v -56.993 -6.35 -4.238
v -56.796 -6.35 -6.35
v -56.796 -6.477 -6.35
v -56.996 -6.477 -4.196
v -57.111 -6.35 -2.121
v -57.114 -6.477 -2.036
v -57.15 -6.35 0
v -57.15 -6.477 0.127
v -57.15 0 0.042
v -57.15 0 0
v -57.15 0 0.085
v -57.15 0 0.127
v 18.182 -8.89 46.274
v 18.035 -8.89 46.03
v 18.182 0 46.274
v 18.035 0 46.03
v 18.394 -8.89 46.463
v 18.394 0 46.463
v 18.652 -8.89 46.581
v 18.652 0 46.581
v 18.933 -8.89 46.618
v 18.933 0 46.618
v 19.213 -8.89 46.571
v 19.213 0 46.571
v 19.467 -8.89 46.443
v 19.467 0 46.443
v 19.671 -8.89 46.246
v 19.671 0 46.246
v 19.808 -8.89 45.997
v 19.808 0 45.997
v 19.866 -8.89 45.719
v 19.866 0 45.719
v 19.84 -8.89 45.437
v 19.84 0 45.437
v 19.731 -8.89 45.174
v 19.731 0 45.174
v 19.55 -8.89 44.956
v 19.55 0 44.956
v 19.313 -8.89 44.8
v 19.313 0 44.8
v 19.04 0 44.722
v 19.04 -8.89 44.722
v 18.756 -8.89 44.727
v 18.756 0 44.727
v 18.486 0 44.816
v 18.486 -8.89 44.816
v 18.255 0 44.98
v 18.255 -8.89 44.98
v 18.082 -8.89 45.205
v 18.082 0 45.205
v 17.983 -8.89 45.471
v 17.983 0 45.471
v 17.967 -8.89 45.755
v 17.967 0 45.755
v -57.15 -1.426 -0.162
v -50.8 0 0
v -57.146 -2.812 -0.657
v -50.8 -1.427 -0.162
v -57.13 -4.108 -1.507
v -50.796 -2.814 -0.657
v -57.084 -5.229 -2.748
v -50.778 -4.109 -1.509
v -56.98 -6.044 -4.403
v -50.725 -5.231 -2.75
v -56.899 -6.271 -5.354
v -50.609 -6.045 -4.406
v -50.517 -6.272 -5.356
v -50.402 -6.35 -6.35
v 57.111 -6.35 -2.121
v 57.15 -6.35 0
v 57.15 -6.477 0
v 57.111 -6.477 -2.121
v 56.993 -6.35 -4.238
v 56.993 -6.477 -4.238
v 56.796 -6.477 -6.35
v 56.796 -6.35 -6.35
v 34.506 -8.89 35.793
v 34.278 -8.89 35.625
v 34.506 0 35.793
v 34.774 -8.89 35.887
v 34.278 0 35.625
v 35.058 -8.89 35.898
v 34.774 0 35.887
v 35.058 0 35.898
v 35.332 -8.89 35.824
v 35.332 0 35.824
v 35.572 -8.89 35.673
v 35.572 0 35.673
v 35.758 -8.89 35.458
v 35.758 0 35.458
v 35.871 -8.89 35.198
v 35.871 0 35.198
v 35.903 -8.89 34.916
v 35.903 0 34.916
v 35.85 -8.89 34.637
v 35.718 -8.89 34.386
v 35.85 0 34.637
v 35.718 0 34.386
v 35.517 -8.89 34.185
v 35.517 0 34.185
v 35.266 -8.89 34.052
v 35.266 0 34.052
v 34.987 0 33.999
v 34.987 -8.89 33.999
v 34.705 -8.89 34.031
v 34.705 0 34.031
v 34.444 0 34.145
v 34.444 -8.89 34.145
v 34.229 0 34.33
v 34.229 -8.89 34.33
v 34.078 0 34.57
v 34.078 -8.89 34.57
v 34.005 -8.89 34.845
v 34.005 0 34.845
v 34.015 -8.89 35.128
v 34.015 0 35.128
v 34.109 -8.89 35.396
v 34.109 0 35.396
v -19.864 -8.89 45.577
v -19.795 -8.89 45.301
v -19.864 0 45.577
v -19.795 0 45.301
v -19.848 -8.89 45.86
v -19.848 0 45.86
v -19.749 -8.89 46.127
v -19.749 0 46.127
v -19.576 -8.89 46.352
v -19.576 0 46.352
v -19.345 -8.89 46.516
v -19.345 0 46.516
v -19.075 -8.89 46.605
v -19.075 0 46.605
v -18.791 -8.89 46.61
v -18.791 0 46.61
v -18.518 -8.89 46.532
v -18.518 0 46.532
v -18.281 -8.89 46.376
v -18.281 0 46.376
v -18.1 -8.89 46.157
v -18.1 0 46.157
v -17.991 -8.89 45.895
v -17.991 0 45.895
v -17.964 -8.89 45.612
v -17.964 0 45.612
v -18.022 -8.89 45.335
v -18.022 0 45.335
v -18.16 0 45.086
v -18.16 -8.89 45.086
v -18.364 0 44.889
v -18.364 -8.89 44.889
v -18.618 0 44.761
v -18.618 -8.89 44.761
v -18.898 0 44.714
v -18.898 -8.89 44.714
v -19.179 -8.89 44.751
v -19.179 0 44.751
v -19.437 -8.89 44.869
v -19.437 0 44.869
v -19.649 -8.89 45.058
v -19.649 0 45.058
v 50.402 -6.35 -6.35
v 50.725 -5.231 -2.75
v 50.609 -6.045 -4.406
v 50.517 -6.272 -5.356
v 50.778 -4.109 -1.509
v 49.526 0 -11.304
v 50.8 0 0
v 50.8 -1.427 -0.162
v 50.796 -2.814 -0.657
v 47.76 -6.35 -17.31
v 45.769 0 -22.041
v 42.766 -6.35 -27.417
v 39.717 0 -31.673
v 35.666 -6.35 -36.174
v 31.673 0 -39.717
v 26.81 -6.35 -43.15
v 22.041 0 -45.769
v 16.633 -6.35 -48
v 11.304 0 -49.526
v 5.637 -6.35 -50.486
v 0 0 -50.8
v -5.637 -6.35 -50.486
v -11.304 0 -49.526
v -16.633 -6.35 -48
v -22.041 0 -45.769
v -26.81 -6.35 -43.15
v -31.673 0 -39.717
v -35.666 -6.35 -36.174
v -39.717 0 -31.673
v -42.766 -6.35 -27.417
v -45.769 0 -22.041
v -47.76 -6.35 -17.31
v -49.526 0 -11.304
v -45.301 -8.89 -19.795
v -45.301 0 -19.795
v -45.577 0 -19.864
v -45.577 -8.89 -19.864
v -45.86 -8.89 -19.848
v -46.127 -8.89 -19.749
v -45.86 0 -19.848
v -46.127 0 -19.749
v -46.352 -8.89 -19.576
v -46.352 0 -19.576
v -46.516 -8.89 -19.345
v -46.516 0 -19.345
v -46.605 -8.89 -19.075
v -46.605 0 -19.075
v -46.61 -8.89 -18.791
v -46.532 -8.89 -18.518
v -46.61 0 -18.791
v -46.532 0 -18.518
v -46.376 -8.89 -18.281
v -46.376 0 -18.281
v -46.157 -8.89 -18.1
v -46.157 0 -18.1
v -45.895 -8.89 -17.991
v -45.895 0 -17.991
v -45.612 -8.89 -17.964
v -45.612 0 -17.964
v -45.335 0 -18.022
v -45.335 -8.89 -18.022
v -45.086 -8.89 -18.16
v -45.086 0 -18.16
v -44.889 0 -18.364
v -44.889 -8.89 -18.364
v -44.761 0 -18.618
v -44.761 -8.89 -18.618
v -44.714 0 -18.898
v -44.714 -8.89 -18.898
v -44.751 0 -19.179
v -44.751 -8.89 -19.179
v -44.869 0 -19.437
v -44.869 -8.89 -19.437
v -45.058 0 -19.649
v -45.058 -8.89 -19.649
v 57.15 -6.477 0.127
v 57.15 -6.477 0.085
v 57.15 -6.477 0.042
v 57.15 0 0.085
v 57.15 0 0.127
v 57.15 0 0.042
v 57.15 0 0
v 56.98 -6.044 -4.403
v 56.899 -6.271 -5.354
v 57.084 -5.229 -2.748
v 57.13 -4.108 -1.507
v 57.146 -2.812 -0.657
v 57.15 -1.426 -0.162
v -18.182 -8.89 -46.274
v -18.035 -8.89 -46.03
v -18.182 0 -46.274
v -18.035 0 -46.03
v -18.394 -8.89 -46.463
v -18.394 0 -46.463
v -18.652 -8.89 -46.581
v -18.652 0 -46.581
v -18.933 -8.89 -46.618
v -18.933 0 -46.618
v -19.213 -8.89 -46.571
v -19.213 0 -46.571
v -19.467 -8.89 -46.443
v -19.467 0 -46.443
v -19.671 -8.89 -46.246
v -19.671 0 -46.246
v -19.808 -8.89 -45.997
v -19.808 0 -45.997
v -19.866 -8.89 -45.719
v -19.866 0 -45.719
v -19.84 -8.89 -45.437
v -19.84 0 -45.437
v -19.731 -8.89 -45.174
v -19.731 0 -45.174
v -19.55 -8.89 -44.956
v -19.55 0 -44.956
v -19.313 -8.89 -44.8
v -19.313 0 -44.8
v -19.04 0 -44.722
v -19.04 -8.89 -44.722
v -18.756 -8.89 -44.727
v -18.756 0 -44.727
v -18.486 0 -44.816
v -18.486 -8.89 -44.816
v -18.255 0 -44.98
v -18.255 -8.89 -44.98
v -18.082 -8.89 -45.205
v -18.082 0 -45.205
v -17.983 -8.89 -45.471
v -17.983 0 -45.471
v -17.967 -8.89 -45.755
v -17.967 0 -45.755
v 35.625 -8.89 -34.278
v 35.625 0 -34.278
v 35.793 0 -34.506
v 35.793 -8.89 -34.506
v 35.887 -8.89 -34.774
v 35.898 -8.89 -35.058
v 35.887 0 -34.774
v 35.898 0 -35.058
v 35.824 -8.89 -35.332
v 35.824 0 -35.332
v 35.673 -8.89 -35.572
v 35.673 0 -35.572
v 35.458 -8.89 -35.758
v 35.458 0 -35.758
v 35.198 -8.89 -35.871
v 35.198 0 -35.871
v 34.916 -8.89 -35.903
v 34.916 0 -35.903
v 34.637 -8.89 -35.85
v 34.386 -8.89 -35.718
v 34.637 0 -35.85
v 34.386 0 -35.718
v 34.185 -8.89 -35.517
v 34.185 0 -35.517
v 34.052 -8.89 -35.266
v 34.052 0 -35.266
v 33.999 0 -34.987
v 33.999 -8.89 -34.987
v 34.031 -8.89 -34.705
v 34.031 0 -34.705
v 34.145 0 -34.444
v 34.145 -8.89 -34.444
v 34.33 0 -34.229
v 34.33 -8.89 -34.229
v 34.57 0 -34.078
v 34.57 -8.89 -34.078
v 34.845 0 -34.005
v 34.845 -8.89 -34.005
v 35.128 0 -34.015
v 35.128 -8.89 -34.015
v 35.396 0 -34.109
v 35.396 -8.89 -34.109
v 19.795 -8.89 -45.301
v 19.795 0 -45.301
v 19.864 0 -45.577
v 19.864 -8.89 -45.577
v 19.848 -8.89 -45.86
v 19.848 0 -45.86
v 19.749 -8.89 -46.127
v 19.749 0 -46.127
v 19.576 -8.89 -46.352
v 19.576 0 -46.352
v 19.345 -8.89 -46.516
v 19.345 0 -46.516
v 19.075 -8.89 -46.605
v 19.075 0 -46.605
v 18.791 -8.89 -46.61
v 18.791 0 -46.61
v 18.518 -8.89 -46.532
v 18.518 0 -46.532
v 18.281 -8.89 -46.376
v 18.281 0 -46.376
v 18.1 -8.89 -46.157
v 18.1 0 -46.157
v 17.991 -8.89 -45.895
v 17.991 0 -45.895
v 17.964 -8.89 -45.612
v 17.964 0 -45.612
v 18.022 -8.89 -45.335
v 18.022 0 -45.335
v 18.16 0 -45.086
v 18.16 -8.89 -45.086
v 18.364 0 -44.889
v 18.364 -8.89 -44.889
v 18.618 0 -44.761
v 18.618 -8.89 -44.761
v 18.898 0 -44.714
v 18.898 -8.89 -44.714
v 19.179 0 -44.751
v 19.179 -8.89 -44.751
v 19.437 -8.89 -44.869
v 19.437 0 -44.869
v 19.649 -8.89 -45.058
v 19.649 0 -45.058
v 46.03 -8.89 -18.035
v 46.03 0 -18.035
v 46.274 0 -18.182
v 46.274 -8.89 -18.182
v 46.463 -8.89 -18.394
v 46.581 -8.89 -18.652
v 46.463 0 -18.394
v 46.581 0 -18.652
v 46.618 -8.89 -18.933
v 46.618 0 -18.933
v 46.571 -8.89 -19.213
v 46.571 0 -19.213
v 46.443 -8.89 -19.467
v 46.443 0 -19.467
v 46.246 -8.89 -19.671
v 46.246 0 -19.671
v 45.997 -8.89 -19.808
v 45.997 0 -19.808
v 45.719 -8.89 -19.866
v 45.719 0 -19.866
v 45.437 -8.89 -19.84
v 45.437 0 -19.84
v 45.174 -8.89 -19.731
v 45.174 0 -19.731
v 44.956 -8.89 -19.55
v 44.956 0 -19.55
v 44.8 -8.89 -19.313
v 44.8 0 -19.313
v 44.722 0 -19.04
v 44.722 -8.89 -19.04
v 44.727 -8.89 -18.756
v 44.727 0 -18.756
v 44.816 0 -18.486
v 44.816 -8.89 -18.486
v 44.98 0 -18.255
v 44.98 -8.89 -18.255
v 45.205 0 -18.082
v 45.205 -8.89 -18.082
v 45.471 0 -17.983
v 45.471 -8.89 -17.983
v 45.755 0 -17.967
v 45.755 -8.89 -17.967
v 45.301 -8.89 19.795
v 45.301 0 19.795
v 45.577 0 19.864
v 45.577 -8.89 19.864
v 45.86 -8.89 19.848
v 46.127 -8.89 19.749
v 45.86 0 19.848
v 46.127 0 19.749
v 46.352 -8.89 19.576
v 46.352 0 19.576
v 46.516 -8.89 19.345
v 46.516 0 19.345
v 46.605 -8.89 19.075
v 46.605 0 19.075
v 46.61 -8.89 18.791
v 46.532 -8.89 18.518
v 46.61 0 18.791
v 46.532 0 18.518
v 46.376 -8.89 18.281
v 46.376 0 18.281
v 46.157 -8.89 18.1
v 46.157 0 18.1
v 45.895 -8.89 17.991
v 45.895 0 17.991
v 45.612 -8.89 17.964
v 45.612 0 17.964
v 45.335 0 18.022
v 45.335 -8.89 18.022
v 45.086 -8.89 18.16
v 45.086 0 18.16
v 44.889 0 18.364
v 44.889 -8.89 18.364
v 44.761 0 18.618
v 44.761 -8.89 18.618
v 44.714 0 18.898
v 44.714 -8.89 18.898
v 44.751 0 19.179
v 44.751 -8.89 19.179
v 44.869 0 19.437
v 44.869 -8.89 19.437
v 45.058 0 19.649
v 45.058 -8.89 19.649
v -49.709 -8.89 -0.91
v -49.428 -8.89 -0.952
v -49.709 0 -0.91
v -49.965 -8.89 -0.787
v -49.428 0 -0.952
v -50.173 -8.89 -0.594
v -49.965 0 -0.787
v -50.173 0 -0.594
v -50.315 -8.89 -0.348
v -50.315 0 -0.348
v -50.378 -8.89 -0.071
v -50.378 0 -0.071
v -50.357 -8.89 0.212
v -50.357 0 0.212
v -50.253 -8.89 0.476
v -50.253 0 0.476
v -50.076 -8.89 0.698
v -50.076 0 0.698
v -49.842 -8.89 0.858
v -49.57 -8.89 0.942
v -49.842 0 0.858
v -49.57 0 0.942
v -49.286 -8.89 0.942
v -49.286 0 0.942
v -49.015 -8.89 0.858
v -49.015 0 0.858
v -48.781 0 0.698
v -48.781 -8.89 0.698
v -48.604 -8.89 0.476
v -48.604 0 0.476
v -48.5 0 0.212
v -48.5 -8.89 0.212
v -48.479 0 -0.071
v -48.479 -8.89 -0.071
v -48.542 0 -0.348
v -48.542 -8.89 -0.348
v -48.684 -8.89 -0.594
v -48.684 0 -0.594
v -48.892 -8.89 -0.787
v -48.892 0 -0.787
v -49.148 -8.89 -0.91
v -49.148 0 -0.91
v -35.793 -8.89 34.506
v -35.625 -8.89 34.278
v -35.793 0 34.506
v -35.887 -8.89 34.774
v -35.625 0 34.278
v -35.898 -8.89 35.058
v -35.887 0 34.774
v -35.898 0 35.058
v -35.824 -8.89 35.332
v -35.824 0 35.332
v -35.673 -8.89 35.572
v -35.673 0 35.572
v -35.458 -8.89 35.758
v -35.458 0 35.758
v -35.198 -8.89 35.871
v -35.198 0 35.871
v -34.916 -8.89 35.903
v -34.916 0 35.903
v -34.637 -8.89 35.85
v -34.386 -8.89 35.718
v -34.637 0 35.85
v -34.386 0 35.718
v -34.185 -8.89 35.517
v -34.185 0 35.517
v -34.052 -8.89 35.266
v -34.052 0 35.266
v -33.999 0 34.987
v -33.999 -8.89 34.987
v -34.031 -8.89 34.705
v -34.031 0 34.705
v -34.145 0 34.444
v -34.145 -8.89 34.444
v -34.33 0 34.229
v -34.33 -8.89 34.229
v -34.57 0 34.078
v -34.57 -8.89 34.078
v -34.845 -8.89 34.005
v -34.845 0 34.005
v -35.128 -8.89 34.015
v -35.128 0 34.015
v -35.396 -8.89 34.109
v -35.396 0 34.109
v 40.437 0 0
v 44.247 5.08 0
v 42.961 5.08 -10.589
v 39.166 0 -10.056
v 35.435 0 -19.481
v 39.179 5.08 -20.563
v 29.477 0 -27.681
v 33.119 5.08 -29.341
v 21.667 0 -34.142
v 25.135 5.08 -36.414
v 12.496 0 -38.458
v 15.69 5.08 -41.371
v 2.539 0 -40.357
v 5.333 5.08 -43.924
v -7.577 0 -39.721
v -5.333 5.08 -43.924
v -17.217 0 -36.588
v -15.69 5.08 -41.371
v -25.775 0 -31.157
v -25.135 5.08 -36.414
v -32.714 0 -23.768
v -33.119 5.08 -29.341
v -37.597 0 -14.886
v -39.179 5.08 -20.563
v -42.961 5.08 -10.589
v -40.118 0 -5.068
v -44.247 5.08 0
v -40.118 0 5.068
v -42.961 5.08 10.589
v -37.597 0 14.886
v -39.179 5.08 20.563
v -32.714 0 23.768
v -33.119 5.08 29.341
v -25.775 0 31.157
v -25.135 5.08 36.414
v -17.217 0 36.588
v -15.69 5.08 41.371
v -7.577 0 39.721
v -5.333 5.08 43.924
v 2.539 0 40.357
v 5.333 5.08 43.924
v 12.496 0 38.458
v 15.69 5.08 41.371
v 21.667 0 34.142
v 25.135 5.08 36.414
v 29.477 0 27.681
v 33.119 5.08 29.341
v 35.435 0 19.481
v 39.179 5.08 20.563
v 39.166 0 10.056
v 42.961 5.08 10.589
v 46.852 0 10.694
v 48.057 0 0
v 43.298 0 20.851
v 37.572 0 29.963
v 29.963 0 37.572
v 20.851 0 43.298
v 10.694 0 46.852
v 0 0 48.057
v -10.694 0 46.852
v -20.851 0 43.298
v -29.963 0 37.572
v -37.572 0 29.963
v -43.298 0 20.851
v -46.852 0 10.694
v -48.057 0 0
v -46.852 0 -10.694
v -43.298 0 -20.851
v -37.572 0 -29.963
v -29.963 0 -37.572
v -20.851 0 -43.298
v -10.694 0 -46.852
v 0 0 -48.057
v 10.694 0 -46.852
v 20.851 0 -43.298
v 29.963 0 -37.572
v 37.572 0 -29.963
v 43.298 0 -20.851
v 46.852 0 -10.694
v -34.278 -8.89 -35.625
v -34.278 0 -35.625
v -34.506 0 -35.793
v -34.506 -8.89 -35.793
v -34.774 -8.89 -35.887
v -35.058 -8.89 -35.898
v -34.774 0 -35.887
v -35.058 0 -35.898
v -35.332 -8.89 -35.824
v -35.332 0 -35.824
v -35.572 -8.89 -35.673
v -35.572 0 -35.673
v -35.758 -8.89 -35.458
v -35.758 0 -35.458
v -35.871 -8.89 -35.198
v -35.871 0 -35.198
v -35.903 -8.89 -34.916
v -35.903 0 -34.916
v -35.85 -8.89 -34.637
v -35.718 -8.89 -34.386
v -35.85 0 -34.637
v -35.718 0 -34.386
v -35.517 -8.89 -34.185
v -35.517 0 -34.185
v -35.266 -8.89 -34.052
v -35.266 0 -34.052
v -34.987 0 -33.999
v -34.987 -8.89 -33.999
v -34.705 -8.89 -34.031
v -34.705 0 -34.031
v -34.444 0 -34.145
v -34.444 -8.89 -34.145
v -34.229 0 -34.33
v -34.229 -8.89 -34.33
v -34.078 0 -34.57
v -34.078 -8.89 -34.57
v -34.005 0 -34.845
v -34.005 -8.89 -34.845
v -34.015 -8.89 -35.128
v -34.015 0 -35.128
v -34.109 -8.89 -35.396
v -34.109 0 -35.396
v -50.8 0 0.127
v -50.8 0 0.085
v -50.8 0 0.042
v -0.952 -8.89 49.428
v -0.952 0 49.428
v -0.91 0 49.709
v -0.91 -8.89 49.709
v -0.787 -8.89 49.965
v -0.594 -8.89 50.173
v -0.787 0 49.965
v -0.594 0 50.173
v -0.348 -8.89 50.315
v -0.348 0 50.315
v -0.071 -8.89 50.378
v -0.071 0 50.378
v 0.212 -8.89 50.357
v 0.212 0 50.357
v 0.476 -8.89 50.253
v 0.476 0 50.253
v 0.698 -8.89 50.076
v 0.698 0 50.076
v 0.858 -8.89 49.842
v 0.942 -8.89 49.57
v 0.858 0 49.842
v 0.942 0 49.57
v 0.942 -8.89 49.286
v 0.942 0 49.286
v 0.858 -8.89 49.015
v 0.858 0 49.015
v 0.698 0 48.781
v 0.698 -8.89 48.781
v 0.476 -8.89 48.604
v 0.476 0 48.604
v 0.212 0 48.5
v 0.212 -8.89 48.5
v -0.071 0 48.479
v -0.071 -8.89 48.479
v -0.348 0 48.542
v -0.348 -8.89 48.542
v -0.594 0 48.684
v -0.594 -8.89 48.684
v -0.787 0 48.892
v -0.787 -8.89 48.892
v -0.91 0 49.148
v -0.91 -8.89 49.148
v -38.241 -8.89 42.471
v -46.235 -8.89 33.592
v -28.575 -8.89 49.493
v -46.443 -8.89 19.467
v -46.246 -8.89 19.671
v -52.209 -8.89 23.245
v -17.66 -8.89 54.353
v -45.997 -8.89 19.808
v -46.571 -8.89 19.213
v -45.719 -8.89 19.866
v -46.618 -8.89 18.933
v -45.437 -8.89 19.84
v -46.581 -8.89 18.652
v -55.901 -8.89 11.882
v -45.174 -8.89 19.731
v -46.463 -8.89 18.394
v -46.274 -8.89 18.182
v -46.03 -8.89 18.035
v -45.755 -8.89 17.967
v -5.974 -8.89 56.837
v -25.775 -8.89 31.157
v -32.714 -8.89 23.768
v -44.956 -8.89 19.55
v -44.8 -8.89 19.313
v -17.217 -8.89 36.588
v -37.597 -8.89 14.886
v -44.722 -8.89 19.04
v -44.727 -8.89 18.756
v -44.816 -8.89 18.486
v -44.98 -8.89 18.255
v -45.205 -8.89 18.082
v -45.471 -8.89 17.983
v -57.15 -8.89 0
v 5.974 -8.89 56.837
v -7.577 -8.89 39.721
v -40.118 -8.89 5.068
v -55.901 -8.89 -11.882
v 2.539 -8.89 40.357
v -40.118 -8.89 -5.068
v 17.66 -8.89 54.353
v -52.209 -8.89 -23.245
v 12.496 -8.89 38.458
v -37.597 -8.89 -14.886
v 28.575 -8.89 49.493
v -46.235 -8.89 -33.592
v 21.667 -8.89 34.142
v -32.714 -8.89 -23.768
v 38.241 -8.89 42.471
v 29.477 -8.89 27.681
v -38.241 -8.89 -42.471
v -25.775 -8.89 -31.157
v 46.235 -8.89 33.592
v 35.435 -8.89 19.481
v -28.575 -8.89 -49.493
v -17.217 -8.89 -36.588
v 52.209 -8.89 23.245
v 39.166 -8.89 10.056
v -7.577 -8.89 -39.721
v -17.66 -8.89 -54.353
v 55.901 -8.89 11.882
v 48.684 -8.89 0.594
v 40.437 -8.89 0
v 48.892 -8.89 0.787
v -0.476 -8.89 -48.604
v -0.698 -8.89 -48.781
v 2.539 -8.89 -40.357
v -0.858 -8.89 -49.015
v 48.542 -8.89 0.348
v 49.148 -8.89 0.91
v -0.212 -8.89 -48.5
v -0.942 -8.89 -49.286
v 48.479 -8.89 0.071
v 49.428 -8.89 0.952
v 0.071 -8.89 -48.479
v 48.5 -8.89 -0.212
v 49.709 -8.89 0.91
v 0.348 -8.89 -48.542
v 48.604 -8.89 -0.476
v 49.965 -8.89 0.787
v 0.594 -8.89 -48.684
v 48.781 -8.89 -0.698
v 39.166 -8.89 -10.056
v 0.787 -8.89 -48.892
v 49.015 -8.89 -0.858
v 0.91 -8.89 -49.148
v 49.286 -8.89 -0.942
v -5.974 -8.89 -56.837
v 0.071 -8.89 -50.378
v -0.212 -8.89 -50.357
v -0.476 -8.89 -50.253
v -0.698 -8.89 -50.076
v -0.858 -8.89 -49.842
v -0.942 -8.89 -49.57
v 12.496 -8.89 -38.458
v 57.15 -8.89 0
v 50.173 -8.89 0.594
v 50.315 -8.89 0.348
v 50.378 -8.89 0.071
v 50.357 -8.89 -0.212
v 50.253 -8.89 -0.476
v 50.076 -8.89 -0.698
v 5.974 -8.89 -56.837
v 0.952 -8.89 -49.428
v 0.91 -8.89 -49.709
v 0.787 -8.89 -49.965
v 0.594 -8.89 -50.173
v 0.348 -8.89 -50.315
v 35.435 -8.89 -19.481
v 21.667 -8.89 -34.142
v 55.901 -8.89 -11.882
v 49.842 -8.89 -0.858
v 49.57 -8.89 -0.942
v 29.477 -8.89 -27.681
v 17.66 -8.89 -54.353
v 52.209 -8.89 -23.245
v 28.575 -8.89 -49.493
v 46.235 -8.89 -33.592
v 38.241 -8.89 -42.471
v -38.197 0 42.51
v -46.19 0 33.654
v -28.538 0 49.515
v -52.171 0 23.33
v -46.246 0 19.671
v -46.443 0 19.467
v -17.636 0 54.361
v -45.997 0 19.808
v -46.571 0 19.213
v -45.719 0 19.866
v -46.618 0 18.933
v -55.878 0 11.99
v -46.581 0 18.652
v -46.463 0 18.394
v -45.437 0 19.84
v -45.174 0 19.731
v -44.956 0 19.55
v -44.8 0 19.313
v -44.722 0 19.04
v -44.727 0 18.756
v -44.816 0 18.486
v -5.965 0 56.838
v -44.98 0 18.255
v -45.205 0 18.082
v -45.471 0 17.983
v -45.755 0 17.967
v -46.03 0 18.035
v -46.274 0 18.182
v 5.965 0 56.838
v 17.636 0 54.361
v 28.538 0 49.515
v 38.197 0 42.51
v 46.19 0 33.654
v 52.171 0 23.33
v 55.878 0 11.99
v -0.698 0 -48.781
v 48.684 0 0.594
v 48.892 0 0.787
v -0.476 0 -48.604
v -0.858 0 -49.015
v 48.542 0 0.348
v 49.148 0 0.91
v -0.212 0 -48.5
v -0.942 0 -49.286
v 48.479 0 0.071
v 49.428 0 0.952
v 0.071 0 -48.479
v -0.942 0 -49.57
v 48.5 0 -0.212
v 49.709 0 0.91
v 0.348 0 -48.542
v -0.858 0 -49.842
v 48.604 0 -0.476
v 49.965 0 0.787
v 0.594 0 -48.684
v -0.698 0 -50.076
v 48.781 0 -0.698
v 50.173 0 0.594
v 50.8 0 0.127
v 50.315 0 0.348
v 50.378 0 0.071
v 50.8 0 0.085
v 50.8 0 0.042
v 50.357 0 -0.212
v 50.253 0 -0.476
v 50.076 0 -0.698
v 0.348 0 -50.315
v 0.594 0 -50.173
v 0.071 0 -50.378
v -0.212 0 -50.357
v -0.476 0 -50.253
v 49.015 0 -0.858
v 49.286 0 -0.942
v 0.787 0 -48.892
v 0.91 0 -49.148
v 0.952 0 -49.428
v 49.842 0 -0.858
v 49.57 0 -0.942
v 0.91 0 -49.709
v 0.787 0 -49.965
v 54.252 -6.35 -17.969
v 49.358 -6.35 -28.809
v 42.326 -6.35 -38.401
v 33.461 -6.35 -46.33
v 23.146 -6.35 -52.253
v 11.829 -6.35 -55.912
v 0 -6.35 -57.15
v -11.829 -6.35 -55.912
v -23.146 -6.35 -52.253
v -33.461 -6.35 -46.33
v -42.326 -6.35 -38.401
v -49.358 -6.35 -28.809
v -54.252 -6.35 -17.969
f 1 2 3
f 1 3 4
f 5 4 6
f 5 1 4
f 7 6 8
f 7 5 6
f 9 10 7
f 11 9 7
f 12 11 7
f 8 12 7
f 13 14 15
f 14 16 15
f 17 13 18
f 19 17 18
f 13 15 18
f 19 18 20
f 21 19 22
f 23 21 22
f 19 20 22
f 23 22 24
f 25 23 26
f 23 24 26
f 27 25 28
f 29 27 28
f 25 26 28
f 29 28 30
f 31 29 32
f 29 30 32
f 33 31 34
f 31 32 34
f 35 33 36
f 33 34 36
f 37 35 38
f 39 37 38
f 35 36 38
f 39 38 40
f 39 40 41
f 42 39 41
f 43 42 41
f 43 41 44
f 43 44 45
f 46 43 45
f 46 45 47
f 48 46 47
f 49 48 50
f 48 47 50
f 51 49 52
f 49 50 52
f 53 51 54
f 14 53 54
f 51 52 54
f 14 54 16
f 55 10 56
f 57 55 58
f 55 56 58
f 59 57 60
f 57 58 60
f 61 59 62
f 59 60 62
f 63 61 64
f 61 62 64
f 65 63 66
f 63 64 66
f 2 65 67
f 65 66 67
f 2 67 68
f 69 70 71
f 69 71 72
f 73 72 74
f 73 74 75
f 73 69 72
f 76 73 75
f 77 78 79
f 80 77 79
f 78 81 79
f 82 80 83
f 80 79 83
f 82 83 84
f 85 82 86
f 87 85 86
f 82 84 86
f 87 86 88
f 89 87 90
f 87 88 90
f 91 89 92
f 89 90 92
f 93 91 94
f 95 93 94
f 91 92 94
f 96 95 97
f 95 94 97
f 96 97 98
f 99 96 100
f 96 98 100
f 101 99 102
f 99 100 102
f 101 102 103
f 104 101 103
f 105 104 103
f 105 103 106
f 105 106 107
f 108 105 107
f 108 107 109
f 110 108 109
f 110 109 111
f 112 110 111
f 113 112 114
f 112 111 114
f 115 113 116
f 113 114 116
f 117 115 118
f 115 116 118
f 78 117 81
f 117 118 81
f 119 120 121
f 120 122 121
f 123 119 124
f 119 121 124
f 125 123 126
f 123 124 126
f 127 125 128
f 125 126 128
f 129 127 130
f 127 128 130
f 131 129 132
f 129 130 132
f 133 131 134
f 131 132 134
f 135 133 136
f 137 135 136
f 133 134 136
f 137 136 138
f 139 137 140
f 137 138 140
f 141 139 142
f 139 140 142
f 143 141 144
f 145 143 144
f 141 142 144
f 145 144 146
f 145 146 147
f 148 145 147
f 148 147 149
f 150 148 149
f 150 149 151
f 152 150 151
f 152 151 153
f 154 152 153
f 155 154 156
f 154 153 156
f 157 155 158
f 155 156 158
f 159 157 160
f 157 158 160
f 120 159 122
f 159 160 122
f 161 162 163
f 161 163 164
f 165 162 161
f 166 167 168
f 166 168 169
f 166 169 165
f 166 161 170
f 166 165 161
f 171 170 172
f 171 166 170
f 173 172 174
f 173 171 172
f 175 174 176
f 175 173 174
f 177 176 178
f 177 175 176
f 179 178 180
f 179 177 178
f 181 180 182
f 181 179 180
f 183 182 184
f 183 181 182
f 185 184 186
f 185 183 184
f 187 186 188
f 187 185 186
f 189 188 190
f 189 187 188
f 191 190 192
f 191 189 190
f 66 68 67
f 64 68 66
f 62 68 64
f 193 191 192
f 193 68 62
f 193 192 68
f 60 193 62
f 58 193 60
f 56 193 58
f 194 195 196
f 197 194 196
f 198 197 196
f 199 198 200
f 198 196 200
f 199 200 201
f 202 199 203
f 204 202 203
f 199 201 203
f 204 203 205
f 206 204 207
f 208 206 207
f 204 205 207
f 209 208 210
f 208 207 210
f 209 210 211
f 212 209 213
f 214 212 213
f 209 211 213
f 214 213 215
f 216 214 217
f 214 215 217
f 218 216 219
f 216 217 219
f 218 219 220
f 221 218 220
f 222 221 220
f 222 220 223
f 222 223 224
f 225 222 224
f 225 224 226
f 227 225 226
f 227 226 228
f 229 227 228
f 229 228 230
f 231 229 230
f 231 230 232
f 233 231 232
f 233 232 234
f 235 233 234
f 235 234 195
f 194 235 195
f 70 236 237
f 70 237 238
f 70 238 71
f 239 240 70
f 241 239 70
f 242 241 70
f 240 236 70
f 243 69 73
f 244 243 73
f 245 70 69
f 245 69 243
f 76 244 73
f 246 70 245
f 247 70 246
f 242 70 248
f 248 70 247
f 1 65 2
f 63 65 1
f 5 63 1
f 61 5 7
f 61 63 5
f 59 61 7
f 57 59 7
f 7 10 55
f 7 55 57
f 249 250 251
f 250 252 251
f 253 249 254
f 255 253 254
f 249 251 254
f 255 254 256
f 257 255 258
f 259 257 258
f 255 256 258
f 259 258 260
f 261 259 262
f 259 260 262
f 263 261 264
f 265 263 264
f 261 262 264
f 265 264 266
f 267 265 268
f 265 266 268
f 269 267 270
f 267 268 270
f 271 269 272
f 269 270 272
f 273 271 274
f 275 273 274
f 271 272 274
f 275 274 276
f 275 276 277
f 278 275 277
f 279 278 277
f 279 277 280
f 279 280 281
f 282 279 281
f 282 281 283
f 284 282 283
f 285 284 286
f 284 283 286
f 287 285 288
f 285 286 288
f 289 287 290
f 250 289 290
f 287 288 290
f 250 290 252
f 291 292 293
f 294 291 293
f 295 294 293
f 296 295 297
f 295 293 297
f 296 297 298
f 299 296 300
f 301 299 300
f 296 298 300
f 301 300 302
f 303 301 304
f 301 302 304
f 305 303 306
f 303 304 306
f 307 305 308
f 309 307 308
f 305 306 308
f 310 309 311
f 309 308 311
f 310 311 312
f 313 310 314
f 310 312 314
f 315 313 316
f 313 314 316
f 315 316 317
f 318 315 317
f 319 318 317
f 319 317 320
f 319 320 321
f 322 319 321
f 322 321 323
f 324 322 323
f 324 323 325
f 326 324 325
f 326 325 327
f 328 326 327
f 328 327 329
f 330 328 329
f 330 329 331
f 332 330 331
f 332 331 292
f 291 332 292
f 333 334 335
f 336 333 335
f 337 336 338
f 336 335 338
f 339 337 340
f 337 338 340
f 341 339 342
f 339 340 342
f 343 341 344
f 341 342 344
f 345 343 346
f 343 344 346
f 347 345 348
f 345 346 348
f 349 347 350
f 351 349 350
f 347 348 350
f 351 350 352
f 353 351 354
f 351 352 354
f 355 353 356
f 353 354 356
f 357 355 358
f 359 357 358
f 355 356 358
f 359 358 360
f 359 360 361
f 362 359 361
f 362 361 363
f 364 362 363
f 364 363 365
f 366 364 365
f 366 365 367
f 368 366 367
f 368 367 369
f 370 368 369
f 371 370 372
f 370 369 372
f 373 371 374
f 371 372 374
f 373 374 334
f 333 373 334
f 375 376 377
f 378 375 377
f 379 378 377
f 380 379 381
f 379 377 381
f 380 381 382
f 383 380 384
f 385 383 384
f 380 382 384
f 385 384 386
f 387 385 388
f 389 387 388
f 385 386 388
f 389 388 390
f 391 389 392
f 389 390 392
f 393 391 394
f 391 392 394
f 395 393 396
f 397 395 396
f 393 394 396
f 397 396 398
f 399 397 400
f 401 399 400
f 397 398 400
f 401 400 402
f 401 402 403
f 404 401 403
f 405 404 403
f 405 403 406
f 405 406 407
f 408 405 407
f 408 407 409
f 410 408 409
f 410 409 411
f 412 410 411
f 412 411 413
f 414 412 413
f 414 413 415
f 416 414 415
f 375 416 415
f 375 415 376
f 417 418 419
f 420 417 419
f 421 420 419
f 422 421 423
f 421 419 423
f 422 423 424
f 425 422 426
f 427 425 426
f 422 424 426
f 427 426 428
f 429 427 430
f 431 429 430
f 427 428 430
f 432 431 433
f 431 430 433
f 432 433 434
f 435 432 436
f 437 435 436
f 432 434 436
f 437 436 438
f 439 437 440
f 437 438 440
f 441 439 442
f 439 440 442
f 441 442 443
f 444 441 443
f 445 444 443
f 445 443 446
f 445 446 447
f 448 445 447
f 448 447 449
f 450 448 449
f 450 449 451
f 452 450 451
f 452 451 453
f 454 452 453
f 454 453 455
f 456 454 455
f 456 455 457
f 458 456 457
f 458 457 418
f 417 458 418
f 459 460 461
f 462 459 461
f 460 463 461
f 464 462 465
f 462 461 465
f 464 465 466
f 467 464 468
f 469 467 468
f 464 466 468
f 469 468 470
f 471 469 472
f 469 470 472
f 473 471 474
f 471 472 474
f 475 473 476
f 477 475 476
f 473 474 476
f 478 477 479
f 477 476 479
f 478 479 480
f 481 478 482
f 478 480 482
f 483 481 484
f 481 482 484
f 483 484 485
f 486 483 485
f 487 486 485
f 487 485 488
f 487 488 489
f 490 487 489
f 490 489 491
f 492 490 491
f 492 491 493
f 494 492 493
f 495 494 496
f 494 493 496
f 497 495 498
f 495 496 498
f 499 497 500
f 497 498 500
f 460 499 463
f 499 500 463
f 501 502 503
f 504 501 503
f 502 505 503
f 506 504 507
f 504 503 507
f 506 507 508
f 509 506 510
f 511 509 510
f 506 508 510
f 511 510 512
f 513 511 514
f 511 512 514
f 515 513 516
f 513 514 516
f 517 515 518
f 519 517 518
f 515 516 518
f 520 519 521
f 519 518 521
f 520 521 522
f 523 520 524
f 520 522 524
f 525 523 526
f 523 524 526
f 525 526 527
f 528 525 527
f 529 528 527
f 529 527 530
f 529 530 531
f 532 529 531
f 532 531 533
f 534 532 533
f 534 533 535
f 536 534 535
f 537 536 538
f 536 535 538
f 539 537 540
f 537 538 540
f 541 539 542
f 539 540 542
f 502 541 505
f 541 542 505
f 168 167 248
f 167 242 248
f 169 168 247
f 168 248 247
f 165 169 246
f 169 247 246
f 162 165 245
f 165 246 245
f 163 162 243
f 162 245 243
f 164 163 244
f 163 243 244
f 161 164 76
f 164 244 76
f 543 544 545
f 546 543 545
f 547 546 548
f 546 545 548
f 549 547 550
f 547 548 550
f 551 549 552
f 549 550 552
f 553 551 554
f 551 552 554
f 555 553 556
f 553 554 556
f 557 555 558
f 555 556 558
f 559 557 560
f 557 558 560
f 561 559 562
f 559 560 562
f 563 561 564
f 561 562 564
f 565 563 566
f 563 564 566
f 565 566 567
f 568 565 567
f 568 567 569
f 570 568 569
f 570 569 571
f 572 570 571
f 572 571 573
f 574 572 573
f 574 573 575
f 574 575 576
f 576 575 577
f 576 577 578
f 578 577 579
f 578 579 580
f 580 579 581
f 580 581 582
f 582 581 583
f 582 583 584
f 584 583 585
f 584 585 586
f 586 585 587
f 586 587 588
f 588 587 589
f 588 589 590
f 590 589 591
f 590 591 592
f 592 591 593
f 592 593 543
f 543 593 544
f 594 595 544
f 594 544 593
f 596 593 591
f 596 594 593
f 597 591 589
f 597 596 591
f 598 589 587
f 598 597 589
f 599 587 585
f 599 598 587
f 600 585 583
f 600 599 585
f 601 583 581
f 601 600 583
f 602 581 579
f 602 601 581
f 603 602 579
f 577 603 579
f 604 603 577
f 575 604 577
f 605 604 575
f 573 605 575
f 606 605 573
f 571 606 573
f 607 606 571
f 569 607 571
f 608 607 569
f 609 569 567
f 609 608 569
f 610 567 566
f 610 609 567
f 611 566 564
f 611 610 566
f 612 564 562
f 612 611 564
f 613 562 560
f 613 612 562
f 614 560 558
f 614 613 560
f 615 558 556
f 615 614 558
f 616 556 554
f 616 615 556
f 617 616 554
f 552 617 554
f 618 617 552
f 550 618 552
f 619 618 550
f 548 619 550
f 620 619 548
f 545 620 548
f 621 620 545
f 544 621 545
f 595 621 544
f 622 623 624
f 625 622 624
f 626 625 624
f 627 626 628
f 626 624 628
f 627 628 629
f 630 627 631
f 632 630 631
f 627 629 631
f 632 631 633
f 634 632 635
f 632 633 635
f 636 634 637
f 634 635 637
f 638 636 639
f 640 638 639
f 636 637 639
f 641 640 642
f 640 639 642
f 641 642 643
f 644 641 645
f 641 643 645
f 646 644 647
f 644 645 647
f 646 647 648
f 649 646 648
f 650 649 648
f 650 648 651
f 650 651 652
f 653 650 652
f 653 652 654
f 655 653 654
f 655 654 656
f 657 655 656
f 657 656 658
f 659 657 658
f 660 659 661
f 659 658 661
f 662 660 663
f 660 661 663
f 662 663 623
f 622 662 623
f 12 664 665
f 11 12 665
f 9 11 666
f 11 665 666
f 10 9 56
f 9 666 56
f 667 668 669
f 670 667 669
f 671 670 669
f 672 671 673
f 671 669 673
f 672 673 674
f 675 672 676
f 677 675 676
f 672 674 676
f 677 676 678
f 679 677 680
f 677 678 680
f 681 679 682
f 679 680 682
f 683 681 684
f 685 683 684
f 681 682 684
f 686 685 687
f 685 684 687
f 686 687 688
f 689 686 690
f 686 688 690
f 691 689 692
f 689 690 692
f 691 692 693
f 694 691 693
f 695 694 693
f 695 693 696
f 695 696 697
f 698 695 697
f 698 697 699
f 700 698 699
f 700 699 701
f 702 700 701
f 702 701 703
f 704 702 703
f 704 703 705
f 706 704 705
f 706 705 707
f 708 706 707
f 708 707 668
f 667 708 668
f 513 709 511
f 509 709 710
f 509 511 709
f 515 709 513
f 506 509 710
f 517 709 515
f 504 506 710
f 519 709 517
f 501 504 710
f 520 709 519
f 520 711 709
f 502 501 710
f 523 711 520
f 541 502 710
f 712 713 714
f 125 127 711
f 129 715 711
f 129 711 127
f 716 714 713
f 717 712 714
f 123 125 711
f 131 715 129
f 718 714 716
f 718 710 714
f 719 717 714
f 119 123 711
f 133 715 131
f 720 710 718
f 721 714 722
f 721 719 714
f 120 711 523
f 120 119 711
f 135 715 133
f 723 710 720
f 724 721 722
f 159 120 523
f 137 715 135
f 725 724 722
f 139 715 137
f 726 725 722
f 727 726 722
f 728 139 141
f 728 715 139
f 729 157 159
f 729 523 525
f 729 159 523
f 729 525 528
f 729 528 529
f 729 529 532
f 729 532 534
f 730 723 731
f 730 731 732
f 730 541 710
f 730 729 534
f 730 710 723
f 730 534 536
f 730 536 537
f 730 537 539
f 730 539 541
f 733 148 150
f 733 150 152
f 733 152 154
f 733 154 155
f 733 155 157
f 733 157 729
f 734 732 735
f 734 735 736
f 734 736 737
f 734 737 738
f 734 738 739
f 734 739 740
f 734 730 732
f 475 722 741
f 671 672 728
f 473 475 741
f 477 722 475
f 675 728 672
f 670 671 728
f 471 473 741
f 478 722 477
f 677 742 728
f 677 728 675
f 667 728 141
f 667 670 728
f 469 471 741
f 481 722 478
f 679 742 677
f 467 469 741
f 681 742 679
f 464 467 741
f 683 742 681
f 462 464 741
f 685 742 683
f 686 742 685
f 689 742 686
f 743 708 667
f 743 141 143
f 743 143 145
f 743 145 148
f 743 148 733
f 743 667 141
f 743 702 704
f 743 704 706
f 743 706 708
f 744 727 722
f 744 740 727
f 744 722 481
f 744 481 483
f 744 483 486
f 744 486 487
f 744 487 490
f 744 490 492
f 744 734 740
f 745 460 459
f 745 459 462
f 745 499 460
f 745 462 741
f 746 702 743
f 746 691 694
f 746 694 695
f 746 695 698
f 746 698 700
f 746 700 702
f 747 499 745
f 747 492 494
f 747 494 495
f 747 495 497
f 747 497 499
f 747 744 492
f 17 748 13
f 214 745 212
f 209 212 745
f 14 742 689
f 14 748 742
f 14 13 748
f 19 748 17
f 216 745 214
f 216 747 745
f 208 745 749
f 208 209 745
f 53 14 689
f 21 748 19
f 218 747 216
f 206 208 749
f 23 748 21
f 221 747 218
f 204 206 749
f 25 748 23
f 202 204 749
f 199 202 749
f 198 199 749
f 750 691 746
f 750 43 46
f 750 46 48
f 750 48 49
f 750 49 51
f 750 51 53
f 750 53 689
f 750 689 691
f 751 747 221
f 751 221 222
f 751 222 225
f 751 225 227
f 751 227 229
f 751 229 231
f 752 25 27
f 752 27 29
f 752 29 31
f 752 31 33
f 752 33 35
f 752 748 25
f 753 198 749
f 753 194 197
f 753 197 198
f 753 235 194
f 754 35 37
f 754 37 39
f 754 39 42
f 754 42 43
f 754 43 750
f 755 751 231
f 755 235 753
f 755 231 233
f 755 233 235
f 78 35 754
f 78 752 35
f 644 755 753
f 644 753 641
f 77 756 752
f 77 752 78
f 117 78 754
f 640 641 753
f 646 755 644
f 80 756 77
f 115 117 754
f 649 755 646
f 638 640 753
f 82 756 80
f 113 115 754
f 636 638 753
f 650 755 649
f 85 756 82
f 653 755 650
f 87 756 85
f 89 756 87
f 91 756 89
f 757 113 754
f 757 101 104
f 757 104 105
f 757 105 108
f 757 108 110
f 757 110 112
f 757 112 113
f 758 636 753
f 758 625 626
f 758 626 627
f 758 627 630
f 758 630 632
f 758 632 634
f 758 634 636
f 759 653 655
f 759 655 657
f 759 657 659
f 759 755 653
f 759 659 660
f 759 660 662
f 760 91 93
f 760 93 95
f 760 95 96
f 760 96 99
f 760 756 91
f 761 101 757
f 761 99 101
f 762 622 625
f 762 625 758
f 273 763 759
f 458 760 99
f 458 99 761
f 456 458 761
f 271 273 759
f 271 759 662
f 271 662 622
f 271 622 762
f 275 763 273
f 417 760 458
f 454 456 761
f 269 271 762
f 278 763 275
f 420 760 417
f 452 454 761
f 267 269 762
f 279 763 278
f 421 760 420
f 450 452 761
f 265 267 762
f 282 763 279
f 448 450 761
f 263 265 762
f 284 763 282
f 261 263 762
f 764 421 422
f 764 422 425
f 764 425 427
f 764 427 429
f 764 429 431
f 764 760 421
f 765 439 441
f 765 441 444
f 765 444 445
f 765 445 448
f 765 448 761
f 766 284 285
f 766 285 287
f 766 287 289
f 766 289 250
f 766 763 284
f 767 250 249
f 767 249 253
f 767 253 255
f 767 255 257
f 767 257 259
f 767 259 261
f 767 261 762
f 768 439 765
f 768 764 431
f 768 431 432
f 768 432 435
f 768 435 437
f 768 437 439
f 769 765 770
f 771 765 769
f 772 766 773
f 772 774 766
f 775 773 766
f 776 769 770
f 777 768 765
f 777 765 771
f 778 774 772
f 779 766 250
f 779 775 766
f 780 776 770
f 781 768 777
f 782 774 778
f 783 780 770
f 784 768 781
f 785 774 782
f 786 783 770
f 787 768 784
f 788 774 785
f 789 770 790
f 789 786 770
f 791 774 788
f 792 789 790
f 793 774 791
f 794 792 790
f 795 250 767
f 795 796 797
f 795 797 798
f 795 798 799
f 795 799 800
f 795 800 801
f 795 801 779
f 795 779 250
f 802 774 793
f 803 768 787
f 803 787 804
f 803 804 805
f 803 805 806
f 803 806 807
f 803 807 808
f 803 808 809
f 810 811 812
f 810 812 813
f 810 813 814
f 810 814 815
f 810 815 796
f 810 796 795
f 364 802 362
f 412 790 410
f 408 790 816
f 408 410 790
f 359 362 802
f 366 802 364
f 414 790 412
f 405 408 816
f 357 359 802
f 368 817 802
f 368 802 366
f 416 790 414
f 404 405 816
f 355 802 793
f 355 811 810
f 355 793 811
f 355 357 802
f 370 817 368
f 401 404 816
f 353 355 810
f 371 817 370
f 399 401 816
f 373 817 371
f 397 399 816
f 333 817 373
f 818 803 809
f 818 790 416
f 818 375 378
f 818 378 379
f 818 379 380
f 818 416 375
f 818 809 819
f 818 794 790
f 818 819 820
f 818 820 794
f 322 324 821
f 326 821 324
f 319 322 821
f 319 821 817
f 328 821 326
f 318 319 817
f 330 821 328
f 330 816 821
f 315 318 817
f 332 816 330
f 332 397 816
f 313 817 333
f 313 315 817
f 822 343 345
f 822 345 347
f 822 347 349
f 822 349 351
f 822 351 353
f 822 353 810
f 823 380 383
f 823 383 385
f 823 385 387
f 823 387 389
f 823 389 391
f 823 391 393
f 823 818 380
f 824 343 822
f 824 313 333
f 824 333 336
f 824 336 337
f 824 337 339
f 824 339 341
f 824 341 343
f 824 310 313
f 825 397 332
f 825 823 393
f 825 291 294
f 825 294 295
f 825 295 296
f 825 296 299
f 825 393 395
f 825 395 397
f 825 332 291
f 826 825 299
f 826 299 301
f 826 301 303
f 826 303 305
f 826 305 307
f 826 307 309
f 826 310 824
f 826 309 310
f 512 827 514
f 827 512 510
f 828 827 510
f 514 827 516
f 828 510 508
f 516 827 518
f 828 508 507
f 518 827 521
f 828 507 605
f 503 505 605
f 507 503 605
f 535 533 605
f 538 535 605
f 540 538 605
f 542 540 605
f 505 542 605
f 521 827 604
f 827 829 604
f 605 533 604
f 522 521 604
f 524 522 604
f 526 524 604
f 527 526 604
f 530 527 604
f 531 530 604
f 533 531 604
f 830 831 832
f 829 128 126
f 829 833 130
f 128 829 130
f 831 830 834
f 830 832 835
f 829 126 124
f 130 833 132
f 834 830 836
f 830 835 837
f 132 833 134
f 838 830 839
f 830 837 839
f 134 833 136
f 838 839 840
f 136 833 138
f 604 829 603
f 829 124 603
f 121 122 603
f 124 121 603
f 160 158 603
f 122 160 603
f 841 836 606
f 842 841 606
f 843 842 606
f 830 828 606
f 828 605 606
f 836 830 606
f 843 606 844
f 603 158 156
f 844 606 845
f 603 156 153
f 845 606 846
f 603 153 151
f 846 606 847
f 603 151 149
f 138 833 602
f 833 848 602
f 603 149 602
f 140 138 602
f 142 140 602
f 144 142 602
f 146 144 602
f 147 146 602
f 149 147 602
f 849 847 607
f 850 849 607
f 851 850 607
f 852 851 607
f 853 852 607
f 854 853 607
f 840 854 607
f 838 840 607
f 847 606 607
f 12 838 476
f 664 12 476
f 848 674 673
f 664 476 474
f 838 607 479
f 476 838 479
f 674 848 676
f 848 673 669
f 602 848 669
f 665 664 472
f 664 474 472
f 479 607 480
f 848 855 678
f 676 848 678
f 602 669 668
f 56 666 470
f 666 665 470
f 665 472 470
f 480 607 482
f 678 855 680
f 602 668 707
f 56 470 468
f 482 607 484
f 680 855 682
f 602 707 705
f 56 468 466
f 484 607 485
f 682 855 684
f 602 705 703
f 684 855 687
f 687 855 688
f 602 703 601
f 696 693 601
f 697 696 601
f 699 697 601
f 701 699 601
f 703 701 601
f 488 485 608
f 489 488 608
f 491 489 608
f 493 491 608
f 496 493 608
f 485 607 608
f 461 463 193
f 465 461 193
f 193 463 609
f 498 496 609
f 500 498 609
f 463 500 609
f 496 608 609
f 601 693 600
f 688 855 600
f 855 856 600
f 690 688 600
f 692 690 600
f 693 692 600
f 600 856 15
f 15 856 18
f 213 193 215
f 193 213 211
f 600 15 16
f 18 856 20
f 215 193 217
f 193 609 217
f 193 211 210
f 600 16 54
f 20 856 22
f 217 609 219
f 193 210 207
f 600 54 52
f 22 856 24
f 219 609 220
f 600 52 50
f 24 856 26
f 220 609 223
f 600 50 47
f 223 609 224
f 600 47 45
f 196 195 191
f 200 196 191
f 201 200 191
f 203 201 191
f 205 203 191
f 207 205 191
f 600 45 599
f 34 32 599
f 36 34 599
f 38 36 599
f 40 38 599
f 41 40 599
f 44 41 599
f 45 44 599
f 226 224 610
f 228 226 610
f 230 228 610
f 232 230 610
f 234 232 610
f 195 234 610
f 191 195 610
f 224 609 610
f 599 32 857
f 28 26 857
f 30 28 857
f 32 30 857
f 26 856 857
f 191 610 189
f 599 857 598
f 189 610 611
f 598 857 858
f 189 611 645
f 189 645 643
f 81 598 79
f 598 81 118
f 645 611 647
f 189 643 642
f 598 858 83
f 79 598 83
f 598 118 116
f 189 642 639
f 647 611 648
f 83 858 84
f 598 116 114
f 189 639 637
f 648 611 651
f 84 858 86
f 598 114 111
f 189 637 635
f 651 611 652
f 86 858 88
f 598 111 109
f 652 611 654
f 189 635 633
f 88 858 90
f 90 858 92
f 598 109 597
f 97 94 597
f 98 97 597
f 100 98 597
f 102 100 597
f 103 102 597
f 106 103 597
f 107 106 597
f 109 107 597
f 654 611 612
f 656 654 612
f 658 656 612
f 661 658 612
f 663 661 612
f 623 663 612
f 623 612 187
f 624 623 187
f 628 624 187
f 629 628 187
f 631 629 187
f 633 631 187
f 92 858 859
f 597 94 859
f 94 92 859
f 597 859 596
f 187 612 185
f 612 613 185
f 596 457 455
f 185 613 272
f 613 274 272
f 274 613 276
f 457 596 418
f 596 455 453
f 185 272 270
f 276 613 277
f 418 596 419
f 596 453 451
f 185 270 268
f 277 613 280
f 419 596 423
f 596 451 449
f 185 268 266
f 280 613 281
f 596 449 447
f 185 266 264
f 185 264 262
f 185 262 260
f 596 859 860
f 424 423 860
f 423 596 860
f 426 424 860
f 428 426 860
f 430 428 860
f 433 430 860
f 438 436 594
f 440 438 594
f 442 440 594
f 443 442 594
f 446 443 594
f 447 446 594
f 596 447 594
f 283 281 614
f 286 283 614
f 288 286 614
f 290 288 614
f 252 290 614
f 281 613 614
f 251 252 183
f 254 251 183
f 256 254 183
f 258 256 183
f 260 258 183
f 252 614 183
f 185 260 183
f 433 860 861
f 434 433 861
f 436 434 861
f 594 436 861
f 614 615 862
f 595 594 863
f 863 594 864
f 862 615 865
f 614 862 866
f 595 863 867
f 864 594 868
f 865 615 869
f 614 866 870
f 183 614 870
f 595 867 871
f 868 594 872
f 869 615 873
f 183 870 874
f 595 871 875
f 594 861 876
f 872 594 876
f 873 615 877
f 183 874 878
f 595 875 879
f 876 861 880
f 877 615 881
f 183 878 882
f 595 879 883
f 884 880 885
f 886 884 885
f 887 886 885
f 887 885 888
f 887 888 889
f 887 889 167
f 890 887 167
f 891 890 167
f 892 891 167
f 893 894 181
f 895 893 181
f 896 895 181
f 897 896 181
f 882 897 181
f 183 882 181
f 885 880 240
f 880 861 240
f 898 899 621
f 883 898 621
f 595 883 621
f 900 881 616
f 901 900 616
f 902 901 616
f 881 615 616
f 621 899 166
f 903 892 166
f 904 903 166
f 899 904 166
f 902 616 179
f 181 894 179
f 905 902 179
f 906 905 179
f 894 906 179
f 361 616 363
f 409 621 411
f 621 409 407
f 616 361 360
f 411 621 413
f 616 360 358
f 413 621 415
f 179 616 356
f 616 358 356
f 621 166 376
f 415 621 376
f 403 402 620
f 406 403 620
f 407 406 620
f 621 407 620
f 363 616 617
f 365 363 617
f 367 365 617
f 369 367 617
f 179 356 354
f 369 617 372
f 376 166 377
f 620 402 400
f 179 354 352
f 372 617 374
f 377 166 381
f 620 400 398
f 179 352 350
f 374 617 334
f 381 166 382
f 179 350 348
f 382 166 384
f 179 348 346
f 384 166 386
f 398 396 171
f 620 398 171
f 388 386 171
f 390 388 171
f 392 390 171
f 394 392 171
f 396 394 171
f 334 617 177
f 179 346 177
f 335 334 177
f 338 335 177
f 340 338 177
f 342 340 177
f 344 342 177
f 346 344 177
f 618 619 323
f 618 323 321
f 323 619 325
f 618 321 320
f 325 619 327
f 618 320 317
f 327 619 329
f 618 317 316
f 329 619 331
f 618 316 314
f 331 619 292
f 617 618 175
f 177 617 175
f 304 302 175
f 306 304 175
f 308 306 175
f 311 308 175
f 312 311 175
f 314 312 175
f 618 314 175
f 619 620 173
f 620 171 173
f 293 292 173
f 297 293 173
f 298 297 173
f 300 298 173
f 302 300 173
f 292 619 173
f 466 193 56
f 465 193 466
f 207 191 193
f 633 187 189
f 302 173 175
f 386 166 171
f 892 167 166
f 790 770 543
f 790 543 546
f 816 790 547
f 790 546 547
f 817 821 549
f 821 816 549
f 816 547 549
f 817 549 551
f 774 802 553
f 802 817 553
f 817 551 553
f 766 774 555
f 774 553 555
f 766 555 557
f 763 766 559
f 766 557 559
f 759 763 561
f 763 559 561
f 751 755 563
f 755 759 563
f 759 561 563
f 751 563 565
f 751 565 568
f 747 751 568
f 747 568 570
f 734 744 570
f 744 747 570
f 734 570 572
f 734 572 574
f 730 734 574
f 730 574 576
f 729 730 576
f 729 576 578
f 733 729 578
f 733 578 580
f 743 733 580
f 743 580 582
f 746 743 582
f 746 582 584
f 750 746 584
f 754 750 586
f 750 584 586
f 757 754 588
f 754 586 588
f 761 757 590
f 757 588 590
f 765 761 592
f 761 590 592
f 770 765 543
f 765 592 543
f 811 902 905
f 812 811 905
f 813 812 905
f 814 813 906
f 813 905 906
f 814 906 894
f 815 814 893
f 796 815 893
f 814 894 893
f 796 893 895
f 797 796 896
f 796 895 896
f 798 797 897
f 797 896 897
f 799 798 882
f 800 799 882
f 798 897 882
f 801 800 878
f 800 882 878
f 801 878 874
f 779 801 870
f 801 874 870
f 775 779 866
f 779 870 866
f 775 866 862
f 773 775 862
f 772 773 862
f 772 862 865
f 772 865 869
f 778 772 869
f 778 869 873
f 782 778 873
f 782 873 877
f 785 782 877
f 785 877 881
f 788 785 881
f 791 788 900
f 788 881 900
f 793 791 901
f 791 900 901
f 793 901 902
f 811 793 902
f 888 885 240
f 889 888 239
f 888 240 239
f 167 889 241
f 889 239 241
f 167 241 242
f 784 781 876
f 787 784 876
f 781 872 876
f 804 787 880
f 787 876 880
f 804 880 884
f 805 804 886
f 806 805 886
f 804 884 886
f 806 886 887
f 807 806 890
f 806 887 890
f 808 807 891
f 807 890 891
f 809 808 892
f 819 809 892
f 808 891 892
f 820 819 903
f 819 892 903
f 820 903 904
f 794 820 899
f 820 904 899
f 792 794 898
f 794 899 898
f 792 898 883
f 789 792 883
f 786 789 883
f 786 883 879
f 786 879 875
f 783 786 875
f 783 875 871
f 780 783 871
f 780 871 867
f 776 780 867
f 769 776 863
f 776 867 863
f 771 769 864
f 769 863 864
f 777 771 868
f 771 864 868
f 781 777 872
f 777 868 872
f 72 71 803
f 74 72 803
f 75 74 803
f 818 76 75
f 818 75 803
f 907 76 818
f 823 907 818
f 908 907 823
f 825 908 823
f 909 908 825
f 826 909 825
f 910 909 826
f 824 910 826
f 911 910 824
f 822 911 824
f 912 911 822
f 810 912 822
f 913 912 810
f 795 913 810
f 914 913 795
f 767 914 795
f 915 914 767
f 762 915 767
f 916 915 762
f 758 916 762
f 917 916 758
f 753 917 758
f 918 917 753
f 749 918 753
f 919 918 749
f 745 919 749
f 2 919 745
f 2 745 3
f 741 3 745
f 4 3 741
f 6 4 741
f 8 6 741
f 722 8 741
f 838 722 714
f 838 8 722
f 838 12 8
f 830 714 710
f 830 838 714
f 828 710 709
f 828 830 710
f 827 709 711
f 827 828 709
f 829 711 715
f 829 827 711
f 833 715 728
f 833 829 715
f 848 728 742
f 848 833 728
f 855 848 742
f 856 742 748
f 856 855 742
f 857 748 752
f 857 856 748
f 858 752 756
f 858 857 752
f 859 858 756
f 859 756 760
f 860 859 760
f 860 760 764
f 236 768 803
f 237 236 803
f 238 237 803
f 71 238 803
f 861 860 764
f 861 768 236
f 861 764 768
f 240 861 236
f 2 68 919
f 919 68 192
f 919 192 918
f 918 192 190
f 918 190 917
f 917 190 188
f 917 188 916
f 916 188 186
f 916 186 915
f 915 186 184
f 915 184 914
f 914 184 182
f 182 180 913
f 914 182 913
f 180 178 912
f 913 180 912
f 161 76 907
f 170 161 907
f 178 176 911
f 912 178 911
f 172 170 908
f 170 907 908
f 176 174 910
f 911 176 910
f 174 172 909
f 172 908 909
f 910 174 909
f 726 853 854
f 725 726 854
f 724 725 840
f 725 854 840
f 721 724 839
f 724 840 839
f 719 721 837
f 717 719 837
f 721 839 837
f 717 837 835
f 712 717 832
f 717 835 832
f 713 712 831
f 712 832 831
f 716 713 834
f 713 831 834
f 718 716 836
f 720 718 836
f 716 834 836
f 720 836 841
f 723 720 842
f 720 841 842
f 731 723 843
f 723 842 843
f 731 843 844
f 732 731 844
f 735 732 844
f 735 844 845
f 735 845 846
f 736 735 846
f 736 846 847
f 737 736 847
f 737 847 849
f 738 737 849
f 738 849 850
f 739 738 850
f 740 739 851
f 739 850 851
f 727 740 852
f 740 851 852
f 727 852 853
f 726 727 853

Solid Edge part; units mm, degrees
sketch "Sketch1" plane through (0, 0, 0) normal (0, -1, 0) x (1, 0, 0)
  circle A0 centre (0, 0) radius 40.4368
  circle A1 centre (0, 0) radius 50.8
  dimension "D1" = 101.6
  dimension "D2" = 114.3
  dimension "D3" = 80.8736
extrude "Protrusion1" add sketch "Sketch1" along normal blind 8.89
sketch "Sketch2" plane through (0, 0, 0) normal (0, 0, 1) x (1, 0, 0)
  line L0 (44.2468, 5.08) -> (40.4368, 0)
  line L1 (40.4368, 0) -> (48.0568, 0)
  line L2 (44.2468, 5.08) -> (48.0568, 0)
revolve "RevolvedProtrusion1" add sketch "Sketch2" angle 360 about axis through (0, 0, 0) along (0, 1, 0)
sketch "Sketch3" plane through (0, 0, 0) normal (0, 1, 0) x (-1, 0, 0)
  circle A0 centre (0, 49.4284) radius 0.9525
extrude "Cutout1" cut sketch "Sketch3" against normal through all
pattern_circular "Pattern_2" count 16 over 360 about axis through (0, 0, 0) along (0, 1, 0) of "Cutout1"
sketch "Sketch4" plane through (0, 0, 0) normal (0, -1, 0) x (1, 0, 0)
  circle A0 centre (0, 0) radius 57.15
  circle A1 centre (0, 0) radius 50.8
  dimension "D1" = 101.6
  dimension "D2" = 114.3
  dimension "D3" = 80.8736
extrude "Protrusion2" add sketch "Sketch4" along normal up to vertex (8.89 mm away)
sketch "Sketch5" plane through (0, 0, 0) normal (0, 1, 0) x (-1, 0, 0)
  line L0 (-57.15, 0) -> (-50.8, 0)
  line L1 (50.8, 0) -> (57.15, 0)
  arc A0 (50.8, 0) -> (-50.8, 0) centre (0, 0) cw
  arc A1 (57.15, 0) -> (-57.15, 0) centre (0, 0) cw
extrude "ExtrudedCutout_34" cut sketch "Sketch5" against normal blind 6.35
fillet "Round_1" radius 6.35 2 edges at (53.975, -6.35, 0) (-53.975, -6.35, 0)
